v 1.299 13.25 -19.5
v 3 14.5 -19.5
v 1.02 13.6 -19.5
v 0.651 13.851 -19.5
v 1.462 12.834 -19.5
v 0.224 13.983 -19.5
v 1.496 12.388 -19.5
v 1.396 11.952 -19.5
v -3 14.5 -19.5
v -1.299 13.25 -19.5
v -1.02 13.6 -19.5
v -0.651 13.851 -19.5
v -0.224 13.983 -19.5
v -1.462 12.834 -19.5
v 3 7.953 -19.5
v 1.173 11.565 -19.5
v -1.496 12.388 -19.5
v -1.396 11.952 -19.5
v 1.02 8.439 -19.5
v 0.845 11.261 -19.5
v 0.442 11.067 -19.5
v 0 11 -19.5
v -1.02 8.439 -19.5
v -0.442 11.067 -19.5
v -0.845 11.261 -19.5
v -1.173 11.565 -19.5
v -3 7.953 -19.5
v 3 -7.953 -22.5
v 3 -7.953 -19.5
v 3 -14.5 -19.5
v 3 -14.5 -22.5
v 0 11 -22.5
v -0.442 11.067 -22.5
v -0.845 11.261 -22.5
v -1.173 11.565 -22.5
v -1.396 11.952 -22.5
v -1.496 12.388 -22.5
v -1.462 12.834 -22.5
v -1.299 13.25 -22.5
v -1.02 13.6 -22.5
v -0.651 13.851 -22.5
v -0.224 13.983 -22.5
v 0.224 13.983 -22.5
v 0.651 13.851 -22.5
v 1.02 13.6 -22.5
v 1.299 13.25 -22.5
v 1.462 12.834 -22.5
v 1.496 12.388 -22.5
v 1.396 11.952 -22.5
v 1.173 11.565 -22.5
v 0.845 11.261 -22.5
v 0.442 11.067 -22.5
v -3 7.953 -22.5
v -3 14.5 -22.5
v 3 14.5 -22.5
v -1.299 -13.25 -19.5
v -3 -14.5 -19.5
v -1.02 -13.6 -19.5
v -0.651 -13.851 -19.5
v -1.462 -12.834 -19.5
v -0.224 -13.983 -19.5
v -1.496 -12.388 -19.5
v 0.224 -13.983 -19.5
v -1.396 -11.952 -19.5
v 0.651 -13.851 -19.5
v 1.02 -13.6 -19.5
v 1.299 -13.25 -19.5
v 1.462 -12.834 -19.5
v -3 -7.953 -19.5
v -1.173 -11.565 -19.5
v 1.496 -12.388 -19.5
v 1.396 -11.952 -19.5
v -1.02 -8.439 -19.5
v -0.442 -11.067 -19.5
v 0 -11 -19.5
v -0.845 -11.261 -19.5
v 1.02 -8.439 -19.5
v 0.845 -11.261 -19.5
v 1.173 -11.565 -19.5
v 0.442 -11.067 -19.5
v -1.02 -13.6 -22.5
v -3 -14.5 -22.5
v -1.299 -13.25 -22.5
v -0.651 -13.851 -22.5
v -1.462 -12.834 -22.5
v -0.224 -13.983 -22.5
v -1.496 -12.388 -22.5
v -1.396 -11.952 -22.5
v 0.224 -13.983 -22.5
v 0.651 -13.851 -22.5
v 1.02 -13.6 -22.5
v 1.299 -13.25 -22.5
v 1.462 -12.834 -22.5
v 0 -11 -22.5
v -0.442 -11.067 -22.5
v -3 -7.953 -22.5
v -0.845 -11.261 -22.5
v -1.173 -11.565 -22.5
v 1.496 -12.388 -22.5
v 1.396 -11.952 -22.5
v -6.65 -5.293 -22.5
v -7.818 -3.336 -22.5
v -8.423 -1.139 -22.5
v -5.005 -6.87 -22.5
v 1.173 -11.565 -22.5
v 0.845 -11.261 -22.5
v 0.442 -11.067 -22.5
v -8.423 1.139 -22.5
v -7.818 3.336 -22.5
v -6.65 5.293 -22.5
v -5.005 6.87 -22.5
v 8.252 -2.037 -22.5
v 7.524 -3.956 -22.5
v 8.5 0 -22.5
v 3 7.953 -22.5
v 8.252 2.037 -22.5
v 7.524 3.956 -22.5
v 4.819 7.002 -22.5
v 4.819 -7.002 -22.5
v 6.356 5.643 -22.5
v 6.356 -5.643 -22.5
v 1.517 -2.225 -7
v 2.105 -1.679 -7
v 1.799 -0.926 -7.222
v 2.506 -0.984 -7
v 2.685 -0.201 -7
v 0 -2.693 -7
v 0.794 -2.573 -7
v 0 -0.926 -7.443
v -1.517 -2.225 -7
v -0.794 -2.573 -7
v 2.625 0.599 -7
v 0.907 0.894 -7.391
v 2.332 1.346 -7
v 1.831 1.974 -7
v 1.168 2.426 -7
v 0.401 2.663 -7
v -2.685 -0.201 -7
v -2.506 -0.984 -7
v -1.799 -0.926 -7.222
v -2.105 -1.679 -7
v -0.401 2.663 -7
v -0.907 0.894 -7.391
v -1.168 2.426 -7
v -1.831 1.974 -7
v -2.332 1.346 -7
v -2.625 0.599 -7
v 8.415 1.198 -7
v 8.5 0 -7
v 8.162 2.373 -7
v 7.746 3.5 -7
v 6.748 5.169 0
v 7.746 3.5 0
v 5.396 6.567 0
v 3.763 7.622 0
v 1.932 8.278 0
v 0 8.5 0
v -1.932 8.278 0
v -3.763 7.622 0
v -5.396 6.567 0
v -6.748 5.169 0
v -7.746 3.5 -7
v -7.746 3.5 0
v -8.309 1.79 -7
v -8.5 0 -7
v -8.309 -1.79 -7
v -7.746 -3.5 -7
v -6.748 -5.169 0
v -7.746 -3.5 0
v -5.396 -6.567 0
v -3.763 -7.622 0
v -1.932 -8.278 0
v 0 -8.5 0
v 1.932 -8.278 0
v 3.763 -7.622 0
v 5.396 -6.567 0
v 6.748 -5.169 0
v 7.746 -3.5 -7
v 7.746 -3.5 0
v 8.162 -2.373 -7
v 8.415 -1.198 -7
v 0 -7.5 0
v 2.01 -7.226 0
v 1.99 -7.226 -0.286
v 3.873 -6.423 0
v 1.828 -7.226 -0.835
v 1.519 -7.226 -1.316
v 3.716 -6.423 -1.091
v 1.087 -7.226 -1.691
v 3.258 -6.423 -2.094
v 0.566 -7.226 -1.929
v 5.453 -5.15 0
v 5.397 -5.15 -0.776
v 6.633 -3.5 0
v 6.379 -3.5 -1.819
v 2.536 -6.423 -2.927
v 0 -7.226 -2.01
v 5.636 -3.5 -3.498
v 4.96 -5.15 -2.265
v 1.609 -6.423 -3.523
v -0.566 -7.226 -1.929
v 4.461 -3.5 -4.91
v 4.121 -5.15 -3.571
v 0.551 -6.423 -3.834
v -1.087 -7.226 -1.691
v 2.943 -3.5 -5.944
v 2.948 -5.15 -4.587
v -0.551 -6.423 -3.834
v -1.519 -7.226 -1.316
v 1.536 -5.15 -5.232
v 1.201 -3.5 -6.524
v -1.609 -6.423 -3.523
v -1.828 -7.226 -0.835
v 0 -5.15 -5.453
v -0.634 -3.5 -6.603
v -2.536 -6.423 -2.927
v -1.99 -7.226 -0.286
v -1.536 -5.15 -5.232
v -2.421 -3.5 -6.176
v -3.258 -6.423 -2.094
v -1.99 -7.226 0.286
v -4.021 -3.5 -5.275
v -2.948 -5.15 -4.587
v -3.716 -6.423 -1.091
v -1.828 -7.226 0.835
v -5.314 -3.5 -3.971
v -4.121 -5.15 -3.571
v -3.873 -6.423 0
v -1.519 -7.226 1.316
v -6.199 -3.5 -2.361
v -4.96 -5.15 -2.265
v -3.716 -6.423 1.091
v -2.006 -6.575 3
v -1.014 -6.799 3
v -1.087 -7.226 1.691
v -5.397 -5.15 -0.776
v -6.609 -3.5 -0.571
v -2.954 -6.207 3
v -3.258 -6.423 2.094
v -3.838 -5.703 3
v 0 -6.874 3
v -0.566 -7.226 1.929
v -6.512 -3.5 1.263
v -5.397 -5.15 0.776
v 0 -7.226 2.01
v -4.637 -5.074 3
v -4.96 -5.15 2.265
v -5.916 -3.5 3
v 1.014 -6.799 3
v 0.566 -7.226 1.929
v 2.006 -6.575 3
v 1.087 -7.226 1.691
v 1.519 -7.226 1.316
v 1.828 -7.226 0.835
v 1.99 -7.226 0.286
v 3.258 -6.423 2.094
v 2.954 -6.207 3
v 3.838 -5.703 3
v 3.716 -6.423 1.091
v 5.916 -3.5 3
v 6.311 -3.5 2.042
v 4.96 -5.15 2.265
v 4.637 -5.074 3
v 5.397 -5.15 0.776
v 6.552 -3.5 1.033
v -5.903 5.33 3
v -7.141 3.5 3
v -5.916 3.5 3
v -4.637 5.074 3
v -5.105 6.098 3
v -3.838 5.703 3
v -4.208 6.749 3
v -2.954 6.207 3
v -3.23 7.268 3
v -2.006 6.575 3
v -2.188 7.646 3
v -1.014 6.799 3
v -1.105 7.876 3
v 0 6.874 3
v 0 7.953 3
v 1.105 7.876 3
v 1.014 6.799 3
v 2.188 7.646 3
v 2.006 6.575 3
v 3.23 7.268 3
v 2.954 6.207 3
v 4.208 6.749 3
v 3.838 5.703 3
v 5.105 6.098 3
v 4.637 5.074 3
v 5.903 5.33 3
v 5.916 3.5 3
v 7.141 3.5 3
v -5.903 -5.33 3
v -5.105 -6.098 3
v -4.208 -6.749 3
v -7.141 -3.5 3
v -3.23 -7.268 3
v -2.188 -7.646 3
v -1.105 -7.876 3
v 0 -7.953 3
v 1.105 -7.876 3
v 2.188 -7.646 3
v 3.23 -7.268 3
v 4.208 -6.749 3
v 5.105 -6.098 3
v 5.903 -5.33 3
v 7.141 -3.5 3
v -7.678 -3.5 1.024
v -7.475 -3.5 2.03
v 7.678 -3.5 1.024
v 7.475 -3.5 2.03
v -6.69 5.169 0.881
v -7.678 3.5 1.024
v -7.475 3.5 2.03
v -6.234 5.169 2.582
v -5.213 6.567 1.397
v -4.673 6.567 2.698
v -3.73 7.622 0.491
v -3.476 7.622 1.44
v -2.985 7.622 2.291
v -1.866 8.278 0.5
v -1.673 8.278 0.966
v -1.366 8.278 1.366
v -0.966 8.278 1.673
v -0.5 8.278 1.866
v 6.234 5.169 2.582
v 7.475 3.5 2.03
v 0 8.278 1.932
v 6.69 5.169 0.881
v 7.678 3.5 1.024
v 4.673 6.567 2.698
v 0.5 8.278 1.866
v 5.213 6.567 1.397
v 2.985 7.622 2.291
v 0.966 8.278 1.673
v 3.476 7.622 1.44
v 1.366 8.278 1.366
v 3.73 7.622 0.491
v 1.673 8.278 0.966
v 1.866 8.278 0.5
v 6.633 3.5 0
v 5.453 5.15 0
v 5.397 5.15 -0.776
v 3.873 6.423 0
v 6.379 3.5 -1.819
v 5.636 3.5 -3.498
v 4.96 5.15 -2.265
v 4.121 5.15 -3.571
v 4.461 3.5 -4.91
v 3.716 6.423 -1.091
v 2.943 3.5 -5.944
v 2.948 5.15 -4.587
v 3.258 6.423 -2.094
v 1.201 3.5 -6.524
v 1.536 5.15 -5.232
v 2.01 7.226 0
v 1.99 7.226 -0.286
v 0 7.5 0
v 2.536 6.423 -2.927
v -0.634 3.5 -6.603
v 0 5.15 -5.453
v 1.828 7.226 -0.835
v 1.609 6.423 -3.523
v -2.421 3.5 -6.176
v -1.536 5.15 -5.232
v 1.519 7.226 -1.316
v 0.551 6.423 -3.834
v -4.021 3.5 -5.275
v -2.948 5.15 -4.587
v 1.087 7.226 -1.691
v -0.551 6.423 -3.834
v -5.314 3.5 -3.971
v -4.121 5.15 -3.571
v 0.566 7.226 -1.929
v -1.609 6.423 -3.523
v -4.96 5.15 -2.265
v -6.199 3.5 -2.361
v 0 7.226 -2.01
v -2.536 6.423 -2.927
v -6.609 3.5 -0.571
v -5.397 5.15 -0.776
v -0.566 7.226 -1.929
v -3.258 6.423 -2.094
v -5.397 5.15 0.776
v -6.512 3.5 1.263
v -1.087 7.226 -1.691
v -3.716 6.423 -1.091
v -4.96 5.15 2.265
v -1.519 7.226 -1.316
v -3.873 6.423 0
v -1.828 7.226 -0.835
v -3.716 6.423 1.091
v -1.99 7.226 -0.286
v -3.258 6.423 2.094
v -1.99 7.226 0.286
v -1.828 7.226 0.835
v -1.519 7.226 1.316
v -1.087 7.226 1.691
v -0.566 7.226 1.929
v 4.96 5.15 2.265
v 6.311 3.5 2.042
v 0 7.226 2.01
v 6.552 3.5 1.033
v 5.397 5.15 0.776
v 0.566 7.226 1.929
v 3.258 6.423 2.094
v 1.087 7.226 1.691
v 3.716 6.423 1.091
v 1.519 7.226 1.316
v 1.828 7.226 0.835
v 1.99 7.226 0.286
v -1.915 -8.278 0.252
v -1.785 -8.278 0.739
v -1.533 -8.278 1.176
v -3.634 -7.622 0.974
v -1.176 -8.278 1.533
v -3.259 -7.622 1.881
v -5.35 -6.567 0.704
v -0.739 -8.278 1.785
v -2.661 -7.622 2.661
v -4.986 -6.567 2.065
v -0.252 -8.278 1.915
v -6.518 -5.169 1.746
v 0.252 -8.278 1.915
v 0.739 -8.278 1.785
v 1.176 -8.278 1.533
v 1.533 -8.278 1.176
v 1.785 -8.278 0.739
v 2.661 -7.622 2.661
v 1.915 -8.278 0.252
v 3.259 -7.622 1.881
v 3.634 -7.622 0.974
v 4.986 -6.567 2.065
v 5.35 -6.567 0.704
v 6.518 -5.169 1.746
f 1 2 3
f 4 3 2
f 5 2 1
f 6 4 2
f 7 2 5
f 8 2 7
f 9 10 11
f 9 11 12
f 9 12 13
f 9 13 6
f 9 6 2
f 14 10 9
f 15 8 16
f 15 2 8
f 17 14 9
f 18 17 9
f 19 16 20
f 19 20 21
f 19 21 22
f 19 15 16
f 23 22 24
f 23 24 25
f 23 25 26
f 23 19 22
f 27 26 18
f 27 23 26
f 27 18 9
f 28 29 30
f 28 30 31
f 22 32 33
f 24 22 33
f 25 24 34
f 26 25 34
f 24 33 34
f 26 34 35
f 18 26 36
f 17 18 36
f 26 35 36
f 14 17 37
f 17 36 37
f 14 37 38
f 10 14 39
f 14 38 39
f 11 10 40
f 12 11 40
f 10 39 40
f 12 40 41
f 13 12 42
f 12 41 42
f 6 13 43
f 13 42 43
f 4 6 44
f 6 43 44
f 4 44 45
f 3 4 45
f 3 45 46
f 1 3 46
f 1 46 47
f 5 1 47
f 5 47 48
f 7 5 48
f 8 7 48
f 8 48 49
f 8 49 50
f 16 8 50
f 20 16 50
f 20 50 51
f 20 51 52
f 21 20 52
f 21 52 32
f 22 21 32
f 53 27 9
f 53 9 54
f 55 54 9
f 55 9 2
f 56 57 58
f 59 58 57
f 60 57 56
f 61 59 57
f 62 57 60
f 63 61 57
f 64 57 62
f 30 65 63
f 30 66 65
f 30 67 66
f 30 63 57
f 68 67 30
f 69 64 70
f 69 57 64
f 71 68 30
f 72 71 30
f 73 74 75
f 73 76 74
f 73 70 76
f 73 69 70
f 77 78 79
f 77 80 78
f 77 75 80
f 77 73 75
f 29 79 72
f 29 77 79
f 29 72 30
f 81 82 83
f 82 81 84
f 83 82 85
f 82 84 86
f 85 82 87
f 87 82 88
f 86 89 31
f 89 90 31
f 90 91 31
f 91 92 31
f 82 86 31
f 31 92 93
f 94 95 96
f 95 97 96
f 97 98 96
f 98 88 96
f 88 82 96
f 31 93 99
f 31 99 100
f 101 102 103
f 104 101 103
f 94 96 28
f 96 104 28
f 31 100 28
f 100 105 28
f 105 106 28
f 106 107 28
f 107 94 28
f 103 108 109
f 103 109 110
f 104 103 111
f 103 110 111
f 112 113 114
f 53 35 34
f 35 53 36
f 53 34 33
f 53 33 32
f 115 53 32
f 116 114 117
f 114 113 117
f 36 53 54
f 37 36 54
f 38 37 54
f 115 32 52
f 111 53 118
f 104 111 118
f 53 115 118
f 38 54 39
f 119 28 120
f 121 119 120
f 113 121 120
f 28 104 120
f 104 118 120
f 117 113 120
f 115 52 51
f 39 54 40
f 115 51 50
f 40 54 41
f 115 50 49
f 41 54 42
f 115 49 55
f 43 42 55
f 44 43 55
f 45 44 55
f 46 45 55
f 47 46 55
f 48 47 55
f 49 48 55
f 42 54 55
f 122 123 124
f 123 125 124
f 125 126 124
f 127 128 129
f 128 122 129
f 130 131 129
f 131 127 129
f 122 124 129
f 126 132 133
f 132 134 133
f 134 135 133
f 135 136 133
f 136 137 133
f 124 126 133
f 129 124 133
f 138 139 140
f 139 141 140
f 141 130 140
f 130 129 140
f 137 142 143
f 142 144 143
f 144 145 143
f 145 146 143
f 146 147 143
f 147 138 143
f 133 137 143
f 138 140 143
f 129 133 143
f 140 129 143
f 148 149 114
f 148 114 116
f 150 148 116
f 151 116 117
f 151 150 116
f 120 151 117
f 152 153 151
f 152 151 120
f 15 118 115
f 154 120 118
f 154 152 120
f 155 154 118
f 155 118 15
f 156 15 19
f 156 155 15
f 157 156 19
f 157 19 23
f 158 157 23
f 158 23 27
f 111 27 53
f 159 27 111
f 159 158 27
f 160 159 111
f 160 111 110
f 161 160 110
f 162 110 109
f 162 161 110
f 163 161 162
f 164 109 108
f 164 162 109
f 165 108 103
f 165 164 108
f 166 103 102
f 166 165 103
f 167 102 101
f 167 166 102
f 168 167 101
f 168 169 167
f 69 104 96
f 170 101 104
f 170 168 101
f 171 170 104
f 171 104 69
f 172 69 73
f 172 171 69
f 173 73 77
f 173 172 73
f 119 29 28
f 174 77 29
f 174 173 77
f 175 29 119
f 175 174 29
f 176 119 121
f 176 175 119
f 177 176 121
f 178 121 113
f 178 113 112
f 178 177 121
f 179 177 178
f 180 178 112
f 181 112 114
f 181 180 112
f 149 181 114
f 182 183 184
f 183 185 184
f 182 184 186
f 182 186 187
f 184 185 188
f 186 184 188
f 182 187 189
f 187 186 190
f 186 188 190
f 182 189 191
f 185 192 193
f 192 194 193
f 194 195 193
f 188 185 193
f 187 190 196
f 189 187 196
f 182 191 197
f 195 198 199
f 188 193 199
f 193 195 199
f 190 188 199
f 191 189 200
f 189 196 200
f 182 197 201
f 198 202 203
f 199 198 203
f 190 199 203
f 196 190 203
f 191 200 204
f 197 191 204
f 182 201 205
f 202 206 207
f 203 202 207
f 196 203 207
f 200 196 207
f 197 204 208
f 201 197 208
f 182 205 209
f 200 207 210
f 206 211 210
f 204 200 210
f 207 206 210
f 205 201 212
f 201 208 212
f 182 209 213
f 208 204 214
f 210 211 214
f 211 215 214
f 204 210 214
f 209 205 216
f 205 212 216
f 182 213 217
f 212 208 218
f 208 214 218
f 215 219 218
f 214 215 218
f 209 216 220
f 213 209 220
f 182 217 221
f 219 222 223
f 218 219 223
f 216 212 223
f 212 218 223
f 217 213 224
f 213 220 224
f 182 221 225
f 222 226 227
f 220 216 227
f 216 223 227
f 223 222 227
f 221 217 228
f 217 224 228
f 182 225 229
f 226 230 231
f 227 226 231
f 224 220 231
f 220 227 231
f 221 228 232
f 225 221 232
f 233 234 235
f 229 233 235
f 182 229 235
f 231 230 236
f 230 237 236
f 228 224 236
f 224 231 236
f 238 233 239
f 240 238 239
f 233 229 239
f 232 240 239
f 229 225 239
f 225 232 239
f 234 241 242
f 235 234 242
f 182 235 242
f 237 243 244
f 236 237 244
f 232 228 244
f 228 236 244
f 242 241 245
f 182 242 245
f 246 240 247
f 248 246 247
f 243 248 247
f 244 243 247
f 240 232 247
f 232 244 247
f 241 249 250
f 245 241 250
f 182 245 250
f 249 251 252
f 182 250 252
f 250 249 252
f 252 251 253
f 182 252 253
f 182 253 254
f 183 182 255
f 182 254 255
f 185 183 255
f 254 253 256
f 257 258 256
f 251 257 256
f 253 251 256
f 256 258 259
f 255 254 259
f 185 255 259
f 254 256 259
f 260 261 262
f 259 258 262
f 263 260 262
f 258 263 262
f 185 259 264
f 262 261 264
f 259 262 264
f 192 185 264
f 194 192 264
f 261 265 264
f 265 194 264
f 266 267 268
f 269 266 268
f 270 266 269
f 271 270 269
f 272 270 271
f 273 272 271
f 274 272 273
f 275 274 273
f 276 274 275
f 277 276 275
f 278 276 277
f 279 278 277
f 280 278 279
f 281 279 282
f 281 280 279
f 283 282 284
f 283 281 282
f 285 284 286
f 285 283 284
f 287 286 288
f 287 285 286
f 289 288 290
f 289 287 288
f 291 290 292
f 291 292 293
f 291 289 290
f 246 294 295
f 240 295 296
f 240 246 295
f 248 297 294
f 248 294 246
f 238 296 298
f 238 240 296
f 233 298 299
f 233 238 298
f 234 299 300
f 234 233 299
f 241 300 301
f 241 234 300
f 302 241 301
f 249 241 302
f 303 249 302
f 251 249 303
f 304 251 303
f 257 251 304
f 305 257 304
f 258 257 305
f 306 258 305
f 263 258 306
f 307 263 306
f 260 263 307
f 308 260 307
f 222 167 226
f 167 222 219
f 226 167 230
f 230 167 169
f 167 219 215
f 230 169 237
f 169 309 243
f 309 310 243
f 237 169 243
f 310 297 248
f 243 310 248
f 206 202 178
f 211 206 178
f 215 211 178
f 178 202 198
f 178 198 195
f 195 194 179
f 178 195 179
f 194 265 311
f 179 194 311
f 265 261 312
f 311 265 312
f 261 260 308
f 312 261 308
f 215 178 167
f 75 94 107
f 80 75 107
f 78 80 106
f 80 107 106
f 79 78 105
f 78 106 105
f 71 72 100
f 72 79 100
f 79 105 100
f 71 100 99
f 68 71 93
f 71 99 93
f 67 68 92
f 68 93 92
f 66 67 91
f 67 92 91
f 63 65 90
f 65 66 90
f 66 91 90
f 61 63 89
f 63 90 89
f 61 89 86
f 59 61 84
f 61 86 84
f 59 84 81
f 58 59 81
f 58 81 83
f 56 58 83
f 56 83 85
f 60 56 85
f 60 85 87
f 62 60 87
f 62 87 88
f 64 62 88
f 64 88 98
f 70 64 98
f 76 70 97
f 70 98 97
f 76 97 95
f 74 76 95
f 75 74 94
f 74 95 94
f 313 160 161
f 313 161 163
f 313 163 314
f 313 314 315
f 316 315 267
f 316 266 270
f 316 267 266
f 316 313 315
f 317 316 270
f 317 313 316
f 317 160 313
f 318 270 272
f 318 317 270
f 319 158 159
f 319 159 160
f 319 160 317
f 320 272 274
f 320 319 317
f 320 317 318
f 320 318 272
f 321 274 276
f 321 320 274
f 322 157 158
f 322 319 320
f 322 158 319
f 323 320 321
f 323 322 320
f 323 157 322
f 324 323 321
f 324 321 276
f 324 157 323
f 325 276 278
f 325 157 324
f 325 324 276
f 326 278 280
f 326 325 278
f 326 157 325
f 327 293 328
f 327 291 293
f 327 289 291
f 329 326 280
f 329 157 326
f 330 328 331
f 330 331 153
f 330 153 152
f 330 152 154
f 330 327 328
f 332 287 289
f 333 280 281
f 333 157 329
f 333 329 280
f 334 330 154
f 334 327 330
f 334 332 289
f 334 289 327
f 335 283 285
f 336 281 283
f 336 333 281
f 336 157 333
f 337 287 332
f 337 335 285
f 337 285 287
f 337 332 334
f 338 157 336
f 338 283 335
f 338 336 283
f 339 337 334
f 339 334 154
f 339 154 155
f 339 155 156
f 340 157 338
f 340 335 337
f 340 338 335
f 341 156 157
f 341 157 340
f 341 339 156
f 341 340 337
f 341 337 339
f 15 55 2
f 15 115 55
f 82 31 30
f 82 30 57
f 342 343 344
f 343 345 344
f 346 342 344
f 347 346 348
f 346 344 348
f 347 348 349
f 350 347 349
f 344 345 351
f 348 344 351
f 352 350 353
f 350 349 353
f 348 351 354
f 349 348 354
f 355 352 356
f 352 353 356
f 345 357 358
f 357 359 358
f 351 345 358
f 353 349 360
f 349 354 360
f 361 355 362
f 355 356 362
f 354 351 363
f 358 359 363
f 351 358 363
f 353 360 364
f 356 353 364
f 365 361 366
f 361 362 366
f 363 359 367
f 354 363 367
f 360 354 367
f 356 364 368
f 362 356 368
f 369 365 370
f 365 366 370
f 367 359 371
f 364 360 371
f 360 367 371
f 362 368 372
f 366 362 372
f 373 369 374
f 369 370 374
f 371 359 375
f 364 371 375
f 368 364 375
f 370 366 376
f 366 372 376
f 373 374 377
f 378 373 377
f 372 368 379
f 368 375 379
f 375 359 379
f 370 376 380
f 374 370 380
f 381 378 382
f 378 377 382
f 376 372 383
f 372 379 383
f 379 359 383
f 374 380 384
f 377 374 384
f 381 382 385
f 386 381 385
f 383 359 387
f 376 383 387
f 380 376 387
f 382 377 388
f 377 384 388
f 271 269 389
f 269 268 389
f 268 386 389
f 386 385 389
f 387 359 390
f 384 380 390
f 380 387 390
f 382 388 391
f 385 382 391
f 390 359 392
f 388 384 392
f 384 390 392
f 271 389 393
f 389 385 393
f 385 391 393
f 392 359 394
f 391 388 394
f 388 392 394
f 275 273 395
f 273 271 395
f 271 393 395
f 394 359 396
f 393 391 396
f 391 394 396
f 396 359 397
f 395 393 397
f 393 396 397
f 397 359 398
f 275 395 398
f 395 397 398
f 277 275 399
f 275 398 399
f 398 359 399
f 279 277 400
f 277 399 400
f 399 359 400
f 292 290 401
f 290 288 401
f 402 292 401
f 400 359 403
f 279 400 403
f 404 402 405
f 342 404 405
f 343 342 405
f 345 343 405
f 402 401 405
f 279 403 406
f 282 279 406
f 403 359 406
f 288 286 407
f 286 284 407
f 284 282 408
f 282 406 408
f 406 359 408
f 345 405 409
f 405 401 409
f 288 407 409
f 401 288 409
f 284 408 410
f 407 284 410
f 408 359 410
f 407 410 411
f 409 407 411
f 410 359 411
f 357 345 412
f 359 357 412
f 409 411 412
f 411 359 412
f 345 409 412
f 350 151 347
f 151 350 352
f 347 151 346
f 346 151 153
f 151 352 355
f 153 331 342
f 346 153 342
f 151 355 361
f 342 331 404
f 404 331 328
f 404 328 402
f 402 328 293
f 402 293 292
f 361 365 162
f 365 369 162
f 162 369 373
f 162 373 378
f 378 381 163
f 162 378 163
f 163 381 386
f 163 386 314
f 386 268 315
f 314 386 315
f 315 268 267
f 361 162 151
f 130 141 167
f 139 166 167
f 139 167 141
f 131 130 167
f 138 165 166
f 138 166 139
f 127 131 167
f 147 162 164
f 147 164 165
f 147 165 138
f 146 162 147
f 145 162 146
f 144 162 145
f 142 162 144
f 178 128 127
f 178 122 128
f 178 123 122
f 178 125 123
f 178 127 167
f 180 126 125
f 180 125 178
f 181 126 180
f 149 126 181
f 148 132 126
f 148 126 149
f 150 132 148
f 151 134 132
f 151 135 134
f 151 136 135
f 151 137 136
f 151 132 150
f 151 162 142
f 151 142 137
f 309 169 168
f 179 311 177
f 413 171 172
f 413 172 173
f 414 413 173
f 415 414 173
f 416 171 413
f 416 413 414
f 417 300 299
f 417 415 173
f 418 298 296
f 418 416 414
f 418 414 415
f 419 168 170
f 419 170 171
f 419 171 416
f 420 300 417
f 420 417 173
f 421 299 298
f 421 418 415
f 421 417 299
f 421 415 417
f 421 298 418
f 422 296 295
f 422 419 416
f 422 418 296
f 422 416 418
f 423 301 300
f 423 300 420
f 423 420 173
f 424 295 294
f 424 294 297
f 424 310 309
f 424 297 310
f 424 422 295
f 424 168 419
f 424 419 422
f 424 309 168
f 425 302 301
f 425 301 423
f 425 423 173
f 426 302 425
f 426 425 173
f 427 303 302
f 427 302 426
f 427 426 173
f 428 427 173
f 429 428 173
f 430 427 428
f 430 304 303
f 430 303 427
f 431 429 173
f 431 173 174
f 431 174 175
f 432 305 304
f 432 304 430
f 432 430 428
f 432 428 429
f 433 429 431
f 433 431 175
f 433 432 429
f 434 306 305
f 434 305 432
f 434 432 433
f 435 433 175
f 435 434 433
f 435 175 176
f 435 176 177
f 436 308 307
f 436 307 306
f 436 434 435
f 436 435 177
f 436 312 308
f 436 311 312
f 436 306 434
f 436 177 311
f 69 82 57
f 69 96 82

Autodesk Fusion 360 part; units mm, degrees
sphere "Sphère de départ" add diameter 17 placed x (1, 0, 0) y (0, 0, -1) z (0, 1, 0) at (0, 0, 0) makes body 1
shell "Evidage sphère" thickness 1 removed faces 0 bodies 1
ref_plane "WorkPlane1" through (0, 0, 3) normal (0, 0, 1) x (1, 0, 0)
split "Section avant" by plane through (0, 0, 3) normal (0, 0, 1) bodies 1 makes body 2 at (-5.4981, 0.571, 6.4572)
delete_body "RemoveBody1" bodies 2
cylinder "Cylindre extension" add diameter 17 height -22.5 placed x (1, 0, 0) y (0, 1, 0) z (0, 0, 1) at (0, 0, 0) separate body makes body 3
sphere "Shère évidage cylindre" cut diameter 15 placed x (1, 0, 0) y (0, 0, -1) z (0, 1, 0) at (0, 0, 0) bodies 3
combine "Combine1" operation add target body 1 tool bodies 3
ref_plane "WorkPlane4" through (0, 8.5, -11.25) normal (0, 1, 0) x (1, 0, 0)
sketch "Sketch vis haut" plane through (0, 8.5, -4.25) normal (0, 1, 0) x (1, 0, 0)
  line L0 (0, 18.25) -> (0, 16.75)
  line L1 (-3, 18.25) -> (3, 18.25)
  line L2 (3, 18.25) -> (3, 15.25)
  line L3 (3, 15.25) -> (-3, 15.25)
  line L4 (-3, 15.25) -> (-3, 18.25)
  line L5 (0, 16.75) -> (0.1, 16.75)
  point P0 (0, 16.75)
  point P1 (0, 18.25)
  dimension "d72" = 1.5
  dimension "d73" = 3
  dimension "d74" = 6
extrude "Extrude vis haut" add sketch "Sketch vis haut" along normal blind 6 and the other way blind 2 separate body makes body 4
hole "Trou vis haut" at (0, 11.5, -19.5) direction (0, 0, -1) diameter 3 depth 3 tip angle 180 bodies 4
mirror "Mirroir vis" about plane through (0, 0, 0) normal (0, 1, 0) of bodies 4 makes body 5
combine "Combine2" operation add target body 1 tool bodies 4 5
sketch "Sketch13" plane through (0, 0, 3) normal (0, 0, 1) x (1, 0, 0)
  line L0 (9, 3.5) -> (-9, 3.5)
  line L1 (-9, 3.5) -> (-9, -3.5)
  line L2 (-9, -3.5) -> (9, -3.5)
  line L3 (9, -3.5) -> (9, 3.5)
  line L4 (9, 3.5) -> (-9, -3.5) construction
  line L5 (-9, 3.5) -> (9, -3.5) construction
  dimension "d54" = 7
  dimension "d55" = 18
extrude "Extrude écartement" cut sketch "Sketch13" against normal blind 10 bodies 1
